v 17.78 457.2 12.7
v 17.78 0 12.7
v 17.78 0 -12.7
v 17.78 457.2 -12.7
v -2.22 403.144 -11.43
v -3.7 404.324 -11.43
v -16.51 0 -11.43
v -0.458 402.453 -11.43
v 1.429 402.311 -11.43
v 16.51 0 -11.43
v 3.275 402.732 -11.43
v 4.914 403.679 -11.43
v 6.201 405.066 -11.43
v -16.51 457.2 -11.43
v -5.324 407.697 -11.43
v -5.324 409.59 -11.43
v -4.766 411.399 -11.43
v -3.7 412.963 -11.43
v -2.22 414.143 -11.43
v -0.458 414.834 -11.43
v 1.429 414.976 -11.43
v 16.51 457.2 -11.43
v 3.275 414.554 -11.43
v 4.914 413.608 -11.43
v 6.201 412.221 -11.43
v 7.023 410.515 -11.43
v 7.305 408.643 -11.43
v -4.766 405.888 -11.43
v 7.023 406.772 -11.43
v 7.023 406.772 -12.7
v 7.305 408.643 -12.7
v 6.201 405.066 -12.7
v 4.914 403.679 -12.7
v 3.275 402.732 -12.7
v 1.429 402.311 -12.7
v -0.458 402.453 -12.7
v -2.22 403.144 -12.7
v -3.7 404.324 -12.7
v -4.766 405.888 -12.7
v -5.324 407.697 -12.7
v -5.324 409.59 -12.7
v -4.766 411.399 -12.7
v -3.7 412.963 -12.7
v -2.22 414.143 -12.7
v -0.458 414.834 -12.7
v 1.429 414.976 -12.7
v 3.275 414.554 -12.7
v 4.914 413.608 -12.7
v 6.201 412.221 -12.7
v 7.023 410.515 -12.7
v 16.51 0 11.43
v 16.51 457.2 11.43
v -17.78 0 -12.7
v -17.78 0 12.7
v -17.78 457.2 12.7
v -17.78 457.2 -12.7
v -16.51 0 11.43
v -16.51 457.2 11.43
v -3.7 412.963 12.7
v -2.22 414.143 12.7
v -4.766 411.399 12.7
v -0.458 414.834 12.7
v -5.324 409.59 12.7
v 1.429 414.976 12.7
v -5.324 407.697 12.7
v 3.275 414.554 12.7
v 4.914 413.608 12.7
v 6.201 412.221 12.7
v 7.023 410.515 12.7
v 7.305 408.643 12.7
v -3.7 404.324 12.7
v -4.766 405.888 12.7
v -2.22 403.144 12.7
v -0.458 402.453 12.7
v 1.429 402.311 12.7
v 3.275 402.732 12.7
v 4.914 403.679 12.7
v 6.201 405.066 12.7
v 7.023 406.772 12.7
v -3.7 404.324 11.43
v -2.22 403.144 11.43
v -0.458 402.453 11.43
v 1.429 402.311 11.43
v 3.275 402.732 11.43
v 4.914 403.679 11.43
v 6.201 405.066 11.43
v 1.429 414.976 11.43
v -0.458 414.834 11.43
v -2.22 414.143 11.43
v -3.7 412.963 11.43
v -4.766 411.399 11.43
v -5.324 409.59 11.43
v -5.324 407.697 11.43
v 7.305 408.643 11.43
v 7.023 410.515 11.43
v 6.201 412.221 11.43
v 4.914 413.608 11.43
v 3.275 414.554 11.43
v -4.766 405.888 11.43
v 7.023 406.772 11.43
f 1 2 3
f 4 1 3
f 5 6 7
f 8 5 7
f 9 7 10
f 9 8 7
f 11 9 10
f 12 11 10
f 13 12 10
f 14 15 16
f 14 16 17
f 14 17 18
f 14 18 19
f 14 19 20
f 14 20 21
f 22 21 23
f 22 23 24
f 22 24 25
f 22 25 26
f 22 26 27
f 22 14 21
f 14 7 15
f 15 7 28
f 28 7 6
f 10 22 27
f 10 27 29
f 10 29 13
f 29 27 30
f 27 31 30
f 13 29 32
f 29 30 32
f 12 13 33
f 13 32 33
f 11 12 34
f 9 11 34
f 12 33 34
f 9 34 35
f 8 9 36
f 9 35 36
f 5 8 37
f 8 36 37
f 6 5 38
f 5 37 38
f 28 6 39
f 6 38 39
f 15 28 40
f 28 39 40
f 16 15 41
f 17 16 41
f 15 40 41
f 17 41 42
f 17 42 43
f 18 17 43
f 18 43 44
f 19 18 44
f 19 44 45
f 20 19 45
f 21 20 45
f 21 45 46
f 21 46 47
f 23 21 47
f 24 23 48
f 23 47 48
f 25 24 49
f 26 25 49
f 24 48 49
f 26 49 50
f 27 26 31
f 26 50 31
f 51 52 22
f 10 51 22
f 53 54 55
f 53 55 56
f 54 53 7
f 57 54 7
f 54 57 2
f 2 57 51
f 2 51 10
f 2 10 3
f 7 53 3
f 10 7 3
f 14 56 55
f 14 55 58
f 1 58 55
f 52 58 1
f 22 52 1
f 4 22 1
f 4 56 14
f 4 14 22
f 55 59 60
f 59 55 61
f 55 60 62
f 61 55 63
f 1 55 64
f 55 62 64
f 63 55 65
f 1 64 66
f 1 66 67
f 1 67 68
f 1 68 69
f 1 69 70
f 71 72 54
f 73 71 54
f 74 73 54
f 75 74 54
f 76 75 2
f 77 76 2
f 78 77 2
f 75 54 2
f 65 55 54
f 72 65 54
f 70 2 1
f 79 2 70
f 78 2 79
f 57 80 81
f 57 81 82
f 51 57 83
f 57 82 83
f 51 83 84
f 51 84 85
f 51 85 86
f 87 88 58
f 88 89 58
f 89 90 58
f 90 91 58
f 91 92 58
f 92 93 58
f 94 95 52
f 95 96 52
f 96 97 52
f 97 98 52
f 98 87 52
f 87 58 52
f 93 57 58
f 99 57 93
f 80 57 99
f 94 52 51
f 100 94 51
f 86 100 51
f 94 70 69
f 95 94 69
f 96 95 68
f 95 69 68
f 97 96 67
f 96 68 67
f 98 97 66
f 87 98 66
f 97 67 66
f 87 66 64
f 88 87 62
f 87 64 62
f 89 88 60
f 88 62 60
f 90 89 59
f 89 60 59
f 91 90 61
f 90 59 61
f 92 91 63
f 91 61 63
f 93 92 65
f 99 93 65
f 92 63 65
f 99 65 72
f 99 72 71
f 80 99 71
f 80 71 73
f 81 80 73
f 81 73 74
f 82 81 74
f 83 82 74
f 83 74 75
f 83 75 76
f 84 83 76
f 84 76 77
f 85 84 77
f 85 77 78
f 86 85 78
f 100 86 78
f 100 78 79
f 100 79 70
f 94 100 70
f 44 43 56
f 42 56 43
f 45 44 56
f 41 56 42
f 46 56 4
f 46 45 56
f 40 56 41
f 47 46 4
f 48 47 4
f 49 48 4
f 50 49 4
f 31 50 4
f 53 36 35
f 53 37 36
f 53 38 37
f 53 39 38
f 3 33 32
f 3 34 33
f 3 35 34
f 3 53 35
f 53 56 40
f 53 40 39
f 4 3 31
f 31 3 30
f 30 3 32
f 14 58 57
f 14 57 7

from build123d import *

# Parameters (mm, degrees)
SKETCH1_W           = 35.56
SKETCH1_H           = 25.4
BOSS_EXTRUDE1_DEPTH = 457.2
SKETCH2_W           = 33.02
SKETCH2_H           = 22.86
CUT_EXTRUDE1_DEPTH  = 458.721813332
CUT_EXTRUDE2_REACH  = 460.25
SKETCH3_R           = 6.35
CUT_EXTRUDE3_REACH  = 460.25
SKETCH4_R           = 6.35


with BuildPart() as part:
    # Sketch1 → Boss-Extrude1 (new body)
    with BuildSketch(Plane(origin=(0, 0, 0), x_dir=(1, 0, 0), z_dir=(0, 1, 0))):
        Rectangle(SKETCH1_W, SKETCH1_H)
    extrude(amount=BOSS_EXTRUDE1_DEPTH)

    # Sketch2 → Cut-Extrude1 (cut, through all)
    with BuildSketch(Plane(origin=(0, 457.2, 0), x_dir=(1, 0, 0), z_dir=(0, 1, 0))):
        Rectangle(SKETCH2_W, SKETCH2_H)
    extrude(amount=-CUT_EXTRUDE1_DEPTH, mode=Mode.SUBTRACT)

    # Sketch3 → Cut-Extrude2 (cut, up to next)
    with BuildSketch(Plane.XY.offset(12.7), mode=Mode.PRIVATE) as cut_extrude2_sk1:
        with Locations((0.954776226, 408.643423165)):
            Circle(SKETCH3_R)
    cut_extrude2_tool1 = extrude(cut_extrude2_sk1.sketch, amount=-CUT_EXTRUDE2_REACH, mode=Mode.PRIVATE) & part.part
    add(cut_extrude2_tool1.solids().sort_by_distance((0.954776, 408.643423, 12.7))[0], mode=Mode.SUBTRACT)

    # Sketch4 → Cut-Extrude3 (cut, up to next)
    with BuildSketch(Plane(origin=(0, 0, -12.7), x_dir=(-1, 0, 0), z_dir=(0, 0, -1)), mode=Mode.PRIVATE) as cut_extrude3_sk1:
        with Locations(Location((-0.954776226, 408.643423165, 0), (0, 0, 180))):
            Circle(SKETCH4_R)
    cut_extrude3_tool1 = extrude(cut_extrude3_sk1.sketch, amount=-CUT_EXTRUDE3_REACH, mode=Mode.PRIVATE) & part.part
    add(cut_extrude3_tool1.solids().sort_by_distance((0.954776, 408.643423, -12.7))[0], mode=Mode.SUBTRACT)


solid = part.part
